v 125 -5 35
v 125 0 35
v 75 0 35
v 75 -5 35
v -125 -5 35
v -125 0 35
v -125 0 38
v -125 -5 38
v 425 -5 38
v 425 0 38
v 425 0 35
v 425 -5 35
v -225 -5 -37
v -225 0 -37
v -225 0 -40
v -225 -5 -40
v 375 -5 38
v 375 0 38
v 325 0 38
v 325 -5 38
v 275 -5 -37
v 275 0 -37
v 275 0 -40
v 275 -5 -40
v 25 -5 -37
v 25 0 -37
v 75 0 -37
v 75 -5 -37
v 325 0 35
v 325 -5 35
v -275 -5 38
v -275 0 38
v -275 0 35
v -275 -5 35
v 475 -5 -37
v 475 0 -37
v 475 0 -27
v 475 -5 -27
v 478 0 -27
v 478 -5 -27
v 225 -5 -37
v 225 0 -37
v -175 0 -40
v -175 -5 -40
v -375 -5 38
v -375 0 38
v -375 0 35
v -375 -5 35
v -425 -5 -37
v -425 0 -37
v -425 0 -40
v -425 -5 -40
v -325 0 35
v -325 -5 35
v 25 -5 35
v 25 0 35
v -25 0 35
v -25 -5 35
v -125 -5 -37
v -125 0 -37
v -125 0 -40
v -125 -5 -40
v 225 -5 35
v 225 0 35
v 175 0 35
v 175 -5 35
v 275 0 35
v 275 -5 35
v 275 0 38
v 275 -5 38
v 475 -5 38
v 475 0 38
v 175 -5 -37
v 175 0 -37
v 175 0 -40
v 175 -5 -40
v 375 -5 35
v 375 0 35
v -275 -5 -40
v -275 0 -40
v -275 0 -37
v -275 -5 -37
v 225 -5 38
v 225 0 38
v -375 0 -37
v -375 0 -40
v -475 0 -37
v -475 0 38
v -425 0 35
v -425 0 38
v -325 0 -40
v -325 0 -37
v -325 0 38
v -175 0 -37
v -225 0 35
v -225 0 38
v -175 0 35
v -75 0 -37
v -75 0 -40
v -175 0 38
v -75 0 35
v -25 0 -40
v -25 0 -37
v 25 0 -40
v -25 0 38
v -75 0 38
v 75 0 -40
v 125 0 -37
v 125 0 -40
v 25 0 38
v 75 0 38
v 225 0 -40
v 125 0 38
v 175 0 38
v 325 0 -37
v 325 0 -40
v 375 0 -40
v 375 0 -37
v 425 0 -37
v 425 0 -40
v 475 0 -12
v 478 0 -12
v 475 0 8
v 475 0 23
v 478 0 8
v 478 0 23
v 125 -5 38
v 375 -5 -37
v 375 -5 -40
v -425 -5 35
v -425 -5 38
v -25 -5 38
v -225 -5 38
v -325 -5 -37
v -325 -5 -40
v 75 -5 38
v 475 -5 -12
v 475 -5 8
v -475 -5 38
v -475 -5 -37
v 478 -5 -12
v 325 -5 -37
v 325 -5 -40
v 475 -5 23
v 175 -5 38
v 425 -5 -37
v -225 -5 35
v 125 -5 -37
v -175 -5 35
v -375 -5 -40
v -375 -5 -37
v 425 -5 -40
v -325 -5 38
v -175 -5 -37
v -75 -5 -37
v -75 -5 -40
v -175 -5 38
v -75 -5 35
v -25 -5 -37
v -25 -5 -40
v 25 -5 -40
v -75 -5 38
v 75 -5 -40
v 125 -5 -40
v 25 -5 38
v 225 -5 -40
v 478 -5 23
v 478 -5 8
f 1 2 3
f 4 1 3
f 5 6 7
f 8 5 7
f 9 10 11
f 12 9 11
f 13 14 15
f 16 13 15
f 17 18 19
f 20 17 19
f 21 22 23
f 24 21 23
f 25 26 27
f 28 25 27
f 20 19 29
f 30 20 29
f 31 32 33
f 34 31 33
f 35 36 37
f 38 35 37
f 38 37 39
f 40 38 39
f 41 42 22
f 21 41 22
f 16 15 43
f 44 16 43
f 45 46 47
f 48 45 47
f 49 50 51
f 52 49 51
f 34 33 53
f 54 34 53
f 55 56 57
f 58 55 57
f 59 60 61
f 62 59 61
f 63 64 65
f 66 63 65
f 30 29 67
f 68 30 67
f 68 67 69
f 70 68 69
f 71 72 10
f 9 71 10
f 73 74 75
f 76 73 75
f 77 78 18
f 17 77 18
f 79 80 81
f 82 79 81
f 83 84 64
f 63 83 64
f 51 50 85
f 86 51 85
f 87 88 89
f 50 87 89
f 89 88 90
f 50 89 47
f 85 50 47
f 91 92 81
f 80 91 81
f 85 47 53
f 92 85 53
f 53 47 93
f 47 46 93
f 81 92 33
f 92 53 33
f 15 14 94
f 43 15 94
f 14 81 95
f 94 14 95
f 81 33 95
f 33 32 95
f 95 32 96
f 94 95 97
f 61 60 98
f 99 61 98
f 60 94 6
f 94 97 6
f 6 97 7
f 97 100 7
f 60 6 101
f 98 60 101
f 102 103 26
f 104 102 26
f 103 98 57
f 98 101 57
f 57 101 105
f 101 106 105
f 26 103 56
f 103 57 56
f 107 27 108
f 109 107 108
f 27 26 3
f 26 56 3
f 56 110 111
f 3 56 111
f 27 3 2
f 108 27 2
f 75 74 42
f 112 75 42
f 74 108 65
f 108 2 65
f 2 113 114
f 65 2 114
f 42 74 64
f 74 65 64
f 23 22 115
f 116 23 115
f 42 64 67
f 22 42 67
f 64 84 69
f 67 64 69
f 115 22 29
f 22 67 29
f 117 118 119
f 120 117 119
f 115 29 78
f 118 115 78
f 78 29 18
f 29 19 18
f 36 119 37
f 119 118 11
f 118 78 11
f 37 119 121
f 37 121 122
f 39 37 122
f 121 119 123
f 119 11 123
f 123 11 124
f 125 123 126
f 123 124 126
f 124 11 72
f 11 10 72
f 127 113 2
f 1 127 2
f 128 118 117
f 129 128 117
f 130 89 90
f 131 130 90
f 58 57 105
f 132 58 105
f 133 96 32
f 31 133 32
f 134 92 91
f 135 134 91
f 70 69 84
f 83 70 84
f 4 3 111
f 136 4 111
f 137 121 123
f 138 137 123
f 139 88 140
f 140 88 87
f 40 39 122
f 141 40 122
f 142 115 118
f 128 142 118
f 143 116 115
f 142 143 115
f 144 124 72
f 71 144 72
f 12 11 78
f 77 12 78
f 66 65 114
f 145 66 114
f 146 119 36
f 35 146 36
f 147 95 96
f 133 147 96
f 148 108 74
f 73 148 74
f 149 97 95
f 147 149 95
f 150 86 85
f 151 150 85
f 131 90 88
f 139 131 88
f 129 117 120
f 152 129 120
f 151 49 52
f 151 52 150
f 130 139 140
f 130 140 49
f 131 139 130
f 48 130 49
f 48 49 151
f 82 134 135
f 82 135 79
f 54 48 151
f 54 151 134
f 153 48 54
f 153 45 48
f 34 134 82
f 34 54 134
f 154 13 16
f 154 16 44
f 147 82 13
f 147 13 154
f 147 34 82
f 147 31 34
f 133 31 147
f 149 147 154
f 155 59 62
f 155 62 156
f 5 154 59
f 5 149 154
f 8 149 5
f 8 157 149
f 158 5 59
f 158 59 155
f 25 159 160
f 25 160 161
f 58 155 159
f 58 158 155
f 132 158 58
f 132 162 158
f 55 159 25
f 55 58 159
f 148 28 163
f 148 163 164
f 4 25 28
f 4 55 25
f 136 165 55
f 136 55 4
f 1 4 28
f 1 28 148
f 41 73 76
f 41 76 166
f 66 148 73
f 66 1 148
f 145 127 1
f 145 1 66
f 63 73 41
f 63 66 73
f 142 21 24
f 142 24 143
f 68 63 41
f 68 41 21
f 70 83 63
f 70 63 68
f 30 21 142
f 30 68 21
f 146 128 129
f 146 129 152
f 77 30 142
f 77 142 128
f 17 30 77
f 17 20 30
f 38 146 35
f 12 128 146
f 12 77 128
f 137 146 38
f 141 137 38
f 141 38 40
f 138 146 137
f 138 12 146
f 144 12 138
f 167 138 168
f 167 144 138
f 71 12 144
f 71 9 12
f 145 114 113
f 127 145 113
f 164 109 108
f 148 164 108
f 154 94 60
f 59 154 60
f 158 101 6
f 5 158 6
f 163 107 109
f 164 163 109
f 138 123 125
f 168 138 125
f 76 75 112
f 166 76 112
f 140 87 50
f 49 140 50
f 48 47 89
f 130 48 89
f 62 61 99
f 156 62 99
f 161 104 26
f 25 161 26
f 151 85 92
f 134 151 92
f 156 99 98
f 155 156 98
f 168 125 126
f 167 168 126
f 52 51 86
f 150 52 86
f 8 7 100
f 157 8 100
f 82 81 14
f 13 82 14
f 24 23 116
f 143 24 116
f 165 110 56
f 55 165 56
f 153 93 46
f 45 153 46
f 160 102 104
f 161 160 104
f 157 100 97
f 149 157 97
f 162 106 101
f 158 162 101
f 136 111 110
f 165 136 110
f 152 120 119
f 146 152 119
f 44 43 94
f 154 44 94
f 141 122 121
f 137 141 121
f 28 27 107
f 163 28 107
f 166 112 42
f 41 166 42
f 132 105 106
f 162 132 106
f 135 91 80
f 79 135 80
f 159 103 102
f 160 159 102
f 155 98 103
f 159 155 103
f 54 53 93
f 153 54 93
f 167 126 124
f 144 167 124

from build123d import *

# Parameters (mm, degrees)
F1_DEPTH = 5


with BuildPart() as f1:
    # F0 (on Front) → F1 (new body)
    with BuildSketch(Plane.XZ):
        Polygon((-375, 35), (-425, 35), (-425, 38), (-475, 38), (-475, 35), (-475, -37), (-425, -37), (-425, -40), (-375, -40), (-375, -37), (-325, -37), (-325, -40), (-275, -40), (-275, -37), (-225, -37), (-225, -40), (-175, -40), (-175, -37), (-125, -37), (-125, -40), (-75, -40), (-75, -37), (-25, -37), (-25, -40), (25, -40), (25, -37), (75, -37), (75, -40), (125, -40), (125, -37), (175, -37), (175, -40), (225, -40), (225, -37), (275, -37), (275, -40), (325, -40), (325, -37), (375, -37), (375, -40), (425, -40), (425, -37), (475, -37), (475, -27), (478, -27), (478, -12), (475, -12), (475, 8), (478, 8), (478, 23), (475, 23), (475, 35), (475, 38), (425, 38), (425, 35), (375, 35), (375, 38), (325, 38), (325, 35), (275, 35), (275, 38), (225, 38), (225, 35), (175, 35), (175, 38), (125, 38), (125, 35), (75, 35), (75, 38), (25, 38), (25, 35), (-25, 35), (-25, 38), (-75, 38), (-75, 35), (-125, 35), (-125, 38), (-175, 38), (-175, 35), (-225, 35), (-225, 38), (-275, 38), (-275, 35), (-325, 35), (-325, 38), (-375, 38), align=None)
    extrude(amount=F1_DEPTH)


solid = f1.part
